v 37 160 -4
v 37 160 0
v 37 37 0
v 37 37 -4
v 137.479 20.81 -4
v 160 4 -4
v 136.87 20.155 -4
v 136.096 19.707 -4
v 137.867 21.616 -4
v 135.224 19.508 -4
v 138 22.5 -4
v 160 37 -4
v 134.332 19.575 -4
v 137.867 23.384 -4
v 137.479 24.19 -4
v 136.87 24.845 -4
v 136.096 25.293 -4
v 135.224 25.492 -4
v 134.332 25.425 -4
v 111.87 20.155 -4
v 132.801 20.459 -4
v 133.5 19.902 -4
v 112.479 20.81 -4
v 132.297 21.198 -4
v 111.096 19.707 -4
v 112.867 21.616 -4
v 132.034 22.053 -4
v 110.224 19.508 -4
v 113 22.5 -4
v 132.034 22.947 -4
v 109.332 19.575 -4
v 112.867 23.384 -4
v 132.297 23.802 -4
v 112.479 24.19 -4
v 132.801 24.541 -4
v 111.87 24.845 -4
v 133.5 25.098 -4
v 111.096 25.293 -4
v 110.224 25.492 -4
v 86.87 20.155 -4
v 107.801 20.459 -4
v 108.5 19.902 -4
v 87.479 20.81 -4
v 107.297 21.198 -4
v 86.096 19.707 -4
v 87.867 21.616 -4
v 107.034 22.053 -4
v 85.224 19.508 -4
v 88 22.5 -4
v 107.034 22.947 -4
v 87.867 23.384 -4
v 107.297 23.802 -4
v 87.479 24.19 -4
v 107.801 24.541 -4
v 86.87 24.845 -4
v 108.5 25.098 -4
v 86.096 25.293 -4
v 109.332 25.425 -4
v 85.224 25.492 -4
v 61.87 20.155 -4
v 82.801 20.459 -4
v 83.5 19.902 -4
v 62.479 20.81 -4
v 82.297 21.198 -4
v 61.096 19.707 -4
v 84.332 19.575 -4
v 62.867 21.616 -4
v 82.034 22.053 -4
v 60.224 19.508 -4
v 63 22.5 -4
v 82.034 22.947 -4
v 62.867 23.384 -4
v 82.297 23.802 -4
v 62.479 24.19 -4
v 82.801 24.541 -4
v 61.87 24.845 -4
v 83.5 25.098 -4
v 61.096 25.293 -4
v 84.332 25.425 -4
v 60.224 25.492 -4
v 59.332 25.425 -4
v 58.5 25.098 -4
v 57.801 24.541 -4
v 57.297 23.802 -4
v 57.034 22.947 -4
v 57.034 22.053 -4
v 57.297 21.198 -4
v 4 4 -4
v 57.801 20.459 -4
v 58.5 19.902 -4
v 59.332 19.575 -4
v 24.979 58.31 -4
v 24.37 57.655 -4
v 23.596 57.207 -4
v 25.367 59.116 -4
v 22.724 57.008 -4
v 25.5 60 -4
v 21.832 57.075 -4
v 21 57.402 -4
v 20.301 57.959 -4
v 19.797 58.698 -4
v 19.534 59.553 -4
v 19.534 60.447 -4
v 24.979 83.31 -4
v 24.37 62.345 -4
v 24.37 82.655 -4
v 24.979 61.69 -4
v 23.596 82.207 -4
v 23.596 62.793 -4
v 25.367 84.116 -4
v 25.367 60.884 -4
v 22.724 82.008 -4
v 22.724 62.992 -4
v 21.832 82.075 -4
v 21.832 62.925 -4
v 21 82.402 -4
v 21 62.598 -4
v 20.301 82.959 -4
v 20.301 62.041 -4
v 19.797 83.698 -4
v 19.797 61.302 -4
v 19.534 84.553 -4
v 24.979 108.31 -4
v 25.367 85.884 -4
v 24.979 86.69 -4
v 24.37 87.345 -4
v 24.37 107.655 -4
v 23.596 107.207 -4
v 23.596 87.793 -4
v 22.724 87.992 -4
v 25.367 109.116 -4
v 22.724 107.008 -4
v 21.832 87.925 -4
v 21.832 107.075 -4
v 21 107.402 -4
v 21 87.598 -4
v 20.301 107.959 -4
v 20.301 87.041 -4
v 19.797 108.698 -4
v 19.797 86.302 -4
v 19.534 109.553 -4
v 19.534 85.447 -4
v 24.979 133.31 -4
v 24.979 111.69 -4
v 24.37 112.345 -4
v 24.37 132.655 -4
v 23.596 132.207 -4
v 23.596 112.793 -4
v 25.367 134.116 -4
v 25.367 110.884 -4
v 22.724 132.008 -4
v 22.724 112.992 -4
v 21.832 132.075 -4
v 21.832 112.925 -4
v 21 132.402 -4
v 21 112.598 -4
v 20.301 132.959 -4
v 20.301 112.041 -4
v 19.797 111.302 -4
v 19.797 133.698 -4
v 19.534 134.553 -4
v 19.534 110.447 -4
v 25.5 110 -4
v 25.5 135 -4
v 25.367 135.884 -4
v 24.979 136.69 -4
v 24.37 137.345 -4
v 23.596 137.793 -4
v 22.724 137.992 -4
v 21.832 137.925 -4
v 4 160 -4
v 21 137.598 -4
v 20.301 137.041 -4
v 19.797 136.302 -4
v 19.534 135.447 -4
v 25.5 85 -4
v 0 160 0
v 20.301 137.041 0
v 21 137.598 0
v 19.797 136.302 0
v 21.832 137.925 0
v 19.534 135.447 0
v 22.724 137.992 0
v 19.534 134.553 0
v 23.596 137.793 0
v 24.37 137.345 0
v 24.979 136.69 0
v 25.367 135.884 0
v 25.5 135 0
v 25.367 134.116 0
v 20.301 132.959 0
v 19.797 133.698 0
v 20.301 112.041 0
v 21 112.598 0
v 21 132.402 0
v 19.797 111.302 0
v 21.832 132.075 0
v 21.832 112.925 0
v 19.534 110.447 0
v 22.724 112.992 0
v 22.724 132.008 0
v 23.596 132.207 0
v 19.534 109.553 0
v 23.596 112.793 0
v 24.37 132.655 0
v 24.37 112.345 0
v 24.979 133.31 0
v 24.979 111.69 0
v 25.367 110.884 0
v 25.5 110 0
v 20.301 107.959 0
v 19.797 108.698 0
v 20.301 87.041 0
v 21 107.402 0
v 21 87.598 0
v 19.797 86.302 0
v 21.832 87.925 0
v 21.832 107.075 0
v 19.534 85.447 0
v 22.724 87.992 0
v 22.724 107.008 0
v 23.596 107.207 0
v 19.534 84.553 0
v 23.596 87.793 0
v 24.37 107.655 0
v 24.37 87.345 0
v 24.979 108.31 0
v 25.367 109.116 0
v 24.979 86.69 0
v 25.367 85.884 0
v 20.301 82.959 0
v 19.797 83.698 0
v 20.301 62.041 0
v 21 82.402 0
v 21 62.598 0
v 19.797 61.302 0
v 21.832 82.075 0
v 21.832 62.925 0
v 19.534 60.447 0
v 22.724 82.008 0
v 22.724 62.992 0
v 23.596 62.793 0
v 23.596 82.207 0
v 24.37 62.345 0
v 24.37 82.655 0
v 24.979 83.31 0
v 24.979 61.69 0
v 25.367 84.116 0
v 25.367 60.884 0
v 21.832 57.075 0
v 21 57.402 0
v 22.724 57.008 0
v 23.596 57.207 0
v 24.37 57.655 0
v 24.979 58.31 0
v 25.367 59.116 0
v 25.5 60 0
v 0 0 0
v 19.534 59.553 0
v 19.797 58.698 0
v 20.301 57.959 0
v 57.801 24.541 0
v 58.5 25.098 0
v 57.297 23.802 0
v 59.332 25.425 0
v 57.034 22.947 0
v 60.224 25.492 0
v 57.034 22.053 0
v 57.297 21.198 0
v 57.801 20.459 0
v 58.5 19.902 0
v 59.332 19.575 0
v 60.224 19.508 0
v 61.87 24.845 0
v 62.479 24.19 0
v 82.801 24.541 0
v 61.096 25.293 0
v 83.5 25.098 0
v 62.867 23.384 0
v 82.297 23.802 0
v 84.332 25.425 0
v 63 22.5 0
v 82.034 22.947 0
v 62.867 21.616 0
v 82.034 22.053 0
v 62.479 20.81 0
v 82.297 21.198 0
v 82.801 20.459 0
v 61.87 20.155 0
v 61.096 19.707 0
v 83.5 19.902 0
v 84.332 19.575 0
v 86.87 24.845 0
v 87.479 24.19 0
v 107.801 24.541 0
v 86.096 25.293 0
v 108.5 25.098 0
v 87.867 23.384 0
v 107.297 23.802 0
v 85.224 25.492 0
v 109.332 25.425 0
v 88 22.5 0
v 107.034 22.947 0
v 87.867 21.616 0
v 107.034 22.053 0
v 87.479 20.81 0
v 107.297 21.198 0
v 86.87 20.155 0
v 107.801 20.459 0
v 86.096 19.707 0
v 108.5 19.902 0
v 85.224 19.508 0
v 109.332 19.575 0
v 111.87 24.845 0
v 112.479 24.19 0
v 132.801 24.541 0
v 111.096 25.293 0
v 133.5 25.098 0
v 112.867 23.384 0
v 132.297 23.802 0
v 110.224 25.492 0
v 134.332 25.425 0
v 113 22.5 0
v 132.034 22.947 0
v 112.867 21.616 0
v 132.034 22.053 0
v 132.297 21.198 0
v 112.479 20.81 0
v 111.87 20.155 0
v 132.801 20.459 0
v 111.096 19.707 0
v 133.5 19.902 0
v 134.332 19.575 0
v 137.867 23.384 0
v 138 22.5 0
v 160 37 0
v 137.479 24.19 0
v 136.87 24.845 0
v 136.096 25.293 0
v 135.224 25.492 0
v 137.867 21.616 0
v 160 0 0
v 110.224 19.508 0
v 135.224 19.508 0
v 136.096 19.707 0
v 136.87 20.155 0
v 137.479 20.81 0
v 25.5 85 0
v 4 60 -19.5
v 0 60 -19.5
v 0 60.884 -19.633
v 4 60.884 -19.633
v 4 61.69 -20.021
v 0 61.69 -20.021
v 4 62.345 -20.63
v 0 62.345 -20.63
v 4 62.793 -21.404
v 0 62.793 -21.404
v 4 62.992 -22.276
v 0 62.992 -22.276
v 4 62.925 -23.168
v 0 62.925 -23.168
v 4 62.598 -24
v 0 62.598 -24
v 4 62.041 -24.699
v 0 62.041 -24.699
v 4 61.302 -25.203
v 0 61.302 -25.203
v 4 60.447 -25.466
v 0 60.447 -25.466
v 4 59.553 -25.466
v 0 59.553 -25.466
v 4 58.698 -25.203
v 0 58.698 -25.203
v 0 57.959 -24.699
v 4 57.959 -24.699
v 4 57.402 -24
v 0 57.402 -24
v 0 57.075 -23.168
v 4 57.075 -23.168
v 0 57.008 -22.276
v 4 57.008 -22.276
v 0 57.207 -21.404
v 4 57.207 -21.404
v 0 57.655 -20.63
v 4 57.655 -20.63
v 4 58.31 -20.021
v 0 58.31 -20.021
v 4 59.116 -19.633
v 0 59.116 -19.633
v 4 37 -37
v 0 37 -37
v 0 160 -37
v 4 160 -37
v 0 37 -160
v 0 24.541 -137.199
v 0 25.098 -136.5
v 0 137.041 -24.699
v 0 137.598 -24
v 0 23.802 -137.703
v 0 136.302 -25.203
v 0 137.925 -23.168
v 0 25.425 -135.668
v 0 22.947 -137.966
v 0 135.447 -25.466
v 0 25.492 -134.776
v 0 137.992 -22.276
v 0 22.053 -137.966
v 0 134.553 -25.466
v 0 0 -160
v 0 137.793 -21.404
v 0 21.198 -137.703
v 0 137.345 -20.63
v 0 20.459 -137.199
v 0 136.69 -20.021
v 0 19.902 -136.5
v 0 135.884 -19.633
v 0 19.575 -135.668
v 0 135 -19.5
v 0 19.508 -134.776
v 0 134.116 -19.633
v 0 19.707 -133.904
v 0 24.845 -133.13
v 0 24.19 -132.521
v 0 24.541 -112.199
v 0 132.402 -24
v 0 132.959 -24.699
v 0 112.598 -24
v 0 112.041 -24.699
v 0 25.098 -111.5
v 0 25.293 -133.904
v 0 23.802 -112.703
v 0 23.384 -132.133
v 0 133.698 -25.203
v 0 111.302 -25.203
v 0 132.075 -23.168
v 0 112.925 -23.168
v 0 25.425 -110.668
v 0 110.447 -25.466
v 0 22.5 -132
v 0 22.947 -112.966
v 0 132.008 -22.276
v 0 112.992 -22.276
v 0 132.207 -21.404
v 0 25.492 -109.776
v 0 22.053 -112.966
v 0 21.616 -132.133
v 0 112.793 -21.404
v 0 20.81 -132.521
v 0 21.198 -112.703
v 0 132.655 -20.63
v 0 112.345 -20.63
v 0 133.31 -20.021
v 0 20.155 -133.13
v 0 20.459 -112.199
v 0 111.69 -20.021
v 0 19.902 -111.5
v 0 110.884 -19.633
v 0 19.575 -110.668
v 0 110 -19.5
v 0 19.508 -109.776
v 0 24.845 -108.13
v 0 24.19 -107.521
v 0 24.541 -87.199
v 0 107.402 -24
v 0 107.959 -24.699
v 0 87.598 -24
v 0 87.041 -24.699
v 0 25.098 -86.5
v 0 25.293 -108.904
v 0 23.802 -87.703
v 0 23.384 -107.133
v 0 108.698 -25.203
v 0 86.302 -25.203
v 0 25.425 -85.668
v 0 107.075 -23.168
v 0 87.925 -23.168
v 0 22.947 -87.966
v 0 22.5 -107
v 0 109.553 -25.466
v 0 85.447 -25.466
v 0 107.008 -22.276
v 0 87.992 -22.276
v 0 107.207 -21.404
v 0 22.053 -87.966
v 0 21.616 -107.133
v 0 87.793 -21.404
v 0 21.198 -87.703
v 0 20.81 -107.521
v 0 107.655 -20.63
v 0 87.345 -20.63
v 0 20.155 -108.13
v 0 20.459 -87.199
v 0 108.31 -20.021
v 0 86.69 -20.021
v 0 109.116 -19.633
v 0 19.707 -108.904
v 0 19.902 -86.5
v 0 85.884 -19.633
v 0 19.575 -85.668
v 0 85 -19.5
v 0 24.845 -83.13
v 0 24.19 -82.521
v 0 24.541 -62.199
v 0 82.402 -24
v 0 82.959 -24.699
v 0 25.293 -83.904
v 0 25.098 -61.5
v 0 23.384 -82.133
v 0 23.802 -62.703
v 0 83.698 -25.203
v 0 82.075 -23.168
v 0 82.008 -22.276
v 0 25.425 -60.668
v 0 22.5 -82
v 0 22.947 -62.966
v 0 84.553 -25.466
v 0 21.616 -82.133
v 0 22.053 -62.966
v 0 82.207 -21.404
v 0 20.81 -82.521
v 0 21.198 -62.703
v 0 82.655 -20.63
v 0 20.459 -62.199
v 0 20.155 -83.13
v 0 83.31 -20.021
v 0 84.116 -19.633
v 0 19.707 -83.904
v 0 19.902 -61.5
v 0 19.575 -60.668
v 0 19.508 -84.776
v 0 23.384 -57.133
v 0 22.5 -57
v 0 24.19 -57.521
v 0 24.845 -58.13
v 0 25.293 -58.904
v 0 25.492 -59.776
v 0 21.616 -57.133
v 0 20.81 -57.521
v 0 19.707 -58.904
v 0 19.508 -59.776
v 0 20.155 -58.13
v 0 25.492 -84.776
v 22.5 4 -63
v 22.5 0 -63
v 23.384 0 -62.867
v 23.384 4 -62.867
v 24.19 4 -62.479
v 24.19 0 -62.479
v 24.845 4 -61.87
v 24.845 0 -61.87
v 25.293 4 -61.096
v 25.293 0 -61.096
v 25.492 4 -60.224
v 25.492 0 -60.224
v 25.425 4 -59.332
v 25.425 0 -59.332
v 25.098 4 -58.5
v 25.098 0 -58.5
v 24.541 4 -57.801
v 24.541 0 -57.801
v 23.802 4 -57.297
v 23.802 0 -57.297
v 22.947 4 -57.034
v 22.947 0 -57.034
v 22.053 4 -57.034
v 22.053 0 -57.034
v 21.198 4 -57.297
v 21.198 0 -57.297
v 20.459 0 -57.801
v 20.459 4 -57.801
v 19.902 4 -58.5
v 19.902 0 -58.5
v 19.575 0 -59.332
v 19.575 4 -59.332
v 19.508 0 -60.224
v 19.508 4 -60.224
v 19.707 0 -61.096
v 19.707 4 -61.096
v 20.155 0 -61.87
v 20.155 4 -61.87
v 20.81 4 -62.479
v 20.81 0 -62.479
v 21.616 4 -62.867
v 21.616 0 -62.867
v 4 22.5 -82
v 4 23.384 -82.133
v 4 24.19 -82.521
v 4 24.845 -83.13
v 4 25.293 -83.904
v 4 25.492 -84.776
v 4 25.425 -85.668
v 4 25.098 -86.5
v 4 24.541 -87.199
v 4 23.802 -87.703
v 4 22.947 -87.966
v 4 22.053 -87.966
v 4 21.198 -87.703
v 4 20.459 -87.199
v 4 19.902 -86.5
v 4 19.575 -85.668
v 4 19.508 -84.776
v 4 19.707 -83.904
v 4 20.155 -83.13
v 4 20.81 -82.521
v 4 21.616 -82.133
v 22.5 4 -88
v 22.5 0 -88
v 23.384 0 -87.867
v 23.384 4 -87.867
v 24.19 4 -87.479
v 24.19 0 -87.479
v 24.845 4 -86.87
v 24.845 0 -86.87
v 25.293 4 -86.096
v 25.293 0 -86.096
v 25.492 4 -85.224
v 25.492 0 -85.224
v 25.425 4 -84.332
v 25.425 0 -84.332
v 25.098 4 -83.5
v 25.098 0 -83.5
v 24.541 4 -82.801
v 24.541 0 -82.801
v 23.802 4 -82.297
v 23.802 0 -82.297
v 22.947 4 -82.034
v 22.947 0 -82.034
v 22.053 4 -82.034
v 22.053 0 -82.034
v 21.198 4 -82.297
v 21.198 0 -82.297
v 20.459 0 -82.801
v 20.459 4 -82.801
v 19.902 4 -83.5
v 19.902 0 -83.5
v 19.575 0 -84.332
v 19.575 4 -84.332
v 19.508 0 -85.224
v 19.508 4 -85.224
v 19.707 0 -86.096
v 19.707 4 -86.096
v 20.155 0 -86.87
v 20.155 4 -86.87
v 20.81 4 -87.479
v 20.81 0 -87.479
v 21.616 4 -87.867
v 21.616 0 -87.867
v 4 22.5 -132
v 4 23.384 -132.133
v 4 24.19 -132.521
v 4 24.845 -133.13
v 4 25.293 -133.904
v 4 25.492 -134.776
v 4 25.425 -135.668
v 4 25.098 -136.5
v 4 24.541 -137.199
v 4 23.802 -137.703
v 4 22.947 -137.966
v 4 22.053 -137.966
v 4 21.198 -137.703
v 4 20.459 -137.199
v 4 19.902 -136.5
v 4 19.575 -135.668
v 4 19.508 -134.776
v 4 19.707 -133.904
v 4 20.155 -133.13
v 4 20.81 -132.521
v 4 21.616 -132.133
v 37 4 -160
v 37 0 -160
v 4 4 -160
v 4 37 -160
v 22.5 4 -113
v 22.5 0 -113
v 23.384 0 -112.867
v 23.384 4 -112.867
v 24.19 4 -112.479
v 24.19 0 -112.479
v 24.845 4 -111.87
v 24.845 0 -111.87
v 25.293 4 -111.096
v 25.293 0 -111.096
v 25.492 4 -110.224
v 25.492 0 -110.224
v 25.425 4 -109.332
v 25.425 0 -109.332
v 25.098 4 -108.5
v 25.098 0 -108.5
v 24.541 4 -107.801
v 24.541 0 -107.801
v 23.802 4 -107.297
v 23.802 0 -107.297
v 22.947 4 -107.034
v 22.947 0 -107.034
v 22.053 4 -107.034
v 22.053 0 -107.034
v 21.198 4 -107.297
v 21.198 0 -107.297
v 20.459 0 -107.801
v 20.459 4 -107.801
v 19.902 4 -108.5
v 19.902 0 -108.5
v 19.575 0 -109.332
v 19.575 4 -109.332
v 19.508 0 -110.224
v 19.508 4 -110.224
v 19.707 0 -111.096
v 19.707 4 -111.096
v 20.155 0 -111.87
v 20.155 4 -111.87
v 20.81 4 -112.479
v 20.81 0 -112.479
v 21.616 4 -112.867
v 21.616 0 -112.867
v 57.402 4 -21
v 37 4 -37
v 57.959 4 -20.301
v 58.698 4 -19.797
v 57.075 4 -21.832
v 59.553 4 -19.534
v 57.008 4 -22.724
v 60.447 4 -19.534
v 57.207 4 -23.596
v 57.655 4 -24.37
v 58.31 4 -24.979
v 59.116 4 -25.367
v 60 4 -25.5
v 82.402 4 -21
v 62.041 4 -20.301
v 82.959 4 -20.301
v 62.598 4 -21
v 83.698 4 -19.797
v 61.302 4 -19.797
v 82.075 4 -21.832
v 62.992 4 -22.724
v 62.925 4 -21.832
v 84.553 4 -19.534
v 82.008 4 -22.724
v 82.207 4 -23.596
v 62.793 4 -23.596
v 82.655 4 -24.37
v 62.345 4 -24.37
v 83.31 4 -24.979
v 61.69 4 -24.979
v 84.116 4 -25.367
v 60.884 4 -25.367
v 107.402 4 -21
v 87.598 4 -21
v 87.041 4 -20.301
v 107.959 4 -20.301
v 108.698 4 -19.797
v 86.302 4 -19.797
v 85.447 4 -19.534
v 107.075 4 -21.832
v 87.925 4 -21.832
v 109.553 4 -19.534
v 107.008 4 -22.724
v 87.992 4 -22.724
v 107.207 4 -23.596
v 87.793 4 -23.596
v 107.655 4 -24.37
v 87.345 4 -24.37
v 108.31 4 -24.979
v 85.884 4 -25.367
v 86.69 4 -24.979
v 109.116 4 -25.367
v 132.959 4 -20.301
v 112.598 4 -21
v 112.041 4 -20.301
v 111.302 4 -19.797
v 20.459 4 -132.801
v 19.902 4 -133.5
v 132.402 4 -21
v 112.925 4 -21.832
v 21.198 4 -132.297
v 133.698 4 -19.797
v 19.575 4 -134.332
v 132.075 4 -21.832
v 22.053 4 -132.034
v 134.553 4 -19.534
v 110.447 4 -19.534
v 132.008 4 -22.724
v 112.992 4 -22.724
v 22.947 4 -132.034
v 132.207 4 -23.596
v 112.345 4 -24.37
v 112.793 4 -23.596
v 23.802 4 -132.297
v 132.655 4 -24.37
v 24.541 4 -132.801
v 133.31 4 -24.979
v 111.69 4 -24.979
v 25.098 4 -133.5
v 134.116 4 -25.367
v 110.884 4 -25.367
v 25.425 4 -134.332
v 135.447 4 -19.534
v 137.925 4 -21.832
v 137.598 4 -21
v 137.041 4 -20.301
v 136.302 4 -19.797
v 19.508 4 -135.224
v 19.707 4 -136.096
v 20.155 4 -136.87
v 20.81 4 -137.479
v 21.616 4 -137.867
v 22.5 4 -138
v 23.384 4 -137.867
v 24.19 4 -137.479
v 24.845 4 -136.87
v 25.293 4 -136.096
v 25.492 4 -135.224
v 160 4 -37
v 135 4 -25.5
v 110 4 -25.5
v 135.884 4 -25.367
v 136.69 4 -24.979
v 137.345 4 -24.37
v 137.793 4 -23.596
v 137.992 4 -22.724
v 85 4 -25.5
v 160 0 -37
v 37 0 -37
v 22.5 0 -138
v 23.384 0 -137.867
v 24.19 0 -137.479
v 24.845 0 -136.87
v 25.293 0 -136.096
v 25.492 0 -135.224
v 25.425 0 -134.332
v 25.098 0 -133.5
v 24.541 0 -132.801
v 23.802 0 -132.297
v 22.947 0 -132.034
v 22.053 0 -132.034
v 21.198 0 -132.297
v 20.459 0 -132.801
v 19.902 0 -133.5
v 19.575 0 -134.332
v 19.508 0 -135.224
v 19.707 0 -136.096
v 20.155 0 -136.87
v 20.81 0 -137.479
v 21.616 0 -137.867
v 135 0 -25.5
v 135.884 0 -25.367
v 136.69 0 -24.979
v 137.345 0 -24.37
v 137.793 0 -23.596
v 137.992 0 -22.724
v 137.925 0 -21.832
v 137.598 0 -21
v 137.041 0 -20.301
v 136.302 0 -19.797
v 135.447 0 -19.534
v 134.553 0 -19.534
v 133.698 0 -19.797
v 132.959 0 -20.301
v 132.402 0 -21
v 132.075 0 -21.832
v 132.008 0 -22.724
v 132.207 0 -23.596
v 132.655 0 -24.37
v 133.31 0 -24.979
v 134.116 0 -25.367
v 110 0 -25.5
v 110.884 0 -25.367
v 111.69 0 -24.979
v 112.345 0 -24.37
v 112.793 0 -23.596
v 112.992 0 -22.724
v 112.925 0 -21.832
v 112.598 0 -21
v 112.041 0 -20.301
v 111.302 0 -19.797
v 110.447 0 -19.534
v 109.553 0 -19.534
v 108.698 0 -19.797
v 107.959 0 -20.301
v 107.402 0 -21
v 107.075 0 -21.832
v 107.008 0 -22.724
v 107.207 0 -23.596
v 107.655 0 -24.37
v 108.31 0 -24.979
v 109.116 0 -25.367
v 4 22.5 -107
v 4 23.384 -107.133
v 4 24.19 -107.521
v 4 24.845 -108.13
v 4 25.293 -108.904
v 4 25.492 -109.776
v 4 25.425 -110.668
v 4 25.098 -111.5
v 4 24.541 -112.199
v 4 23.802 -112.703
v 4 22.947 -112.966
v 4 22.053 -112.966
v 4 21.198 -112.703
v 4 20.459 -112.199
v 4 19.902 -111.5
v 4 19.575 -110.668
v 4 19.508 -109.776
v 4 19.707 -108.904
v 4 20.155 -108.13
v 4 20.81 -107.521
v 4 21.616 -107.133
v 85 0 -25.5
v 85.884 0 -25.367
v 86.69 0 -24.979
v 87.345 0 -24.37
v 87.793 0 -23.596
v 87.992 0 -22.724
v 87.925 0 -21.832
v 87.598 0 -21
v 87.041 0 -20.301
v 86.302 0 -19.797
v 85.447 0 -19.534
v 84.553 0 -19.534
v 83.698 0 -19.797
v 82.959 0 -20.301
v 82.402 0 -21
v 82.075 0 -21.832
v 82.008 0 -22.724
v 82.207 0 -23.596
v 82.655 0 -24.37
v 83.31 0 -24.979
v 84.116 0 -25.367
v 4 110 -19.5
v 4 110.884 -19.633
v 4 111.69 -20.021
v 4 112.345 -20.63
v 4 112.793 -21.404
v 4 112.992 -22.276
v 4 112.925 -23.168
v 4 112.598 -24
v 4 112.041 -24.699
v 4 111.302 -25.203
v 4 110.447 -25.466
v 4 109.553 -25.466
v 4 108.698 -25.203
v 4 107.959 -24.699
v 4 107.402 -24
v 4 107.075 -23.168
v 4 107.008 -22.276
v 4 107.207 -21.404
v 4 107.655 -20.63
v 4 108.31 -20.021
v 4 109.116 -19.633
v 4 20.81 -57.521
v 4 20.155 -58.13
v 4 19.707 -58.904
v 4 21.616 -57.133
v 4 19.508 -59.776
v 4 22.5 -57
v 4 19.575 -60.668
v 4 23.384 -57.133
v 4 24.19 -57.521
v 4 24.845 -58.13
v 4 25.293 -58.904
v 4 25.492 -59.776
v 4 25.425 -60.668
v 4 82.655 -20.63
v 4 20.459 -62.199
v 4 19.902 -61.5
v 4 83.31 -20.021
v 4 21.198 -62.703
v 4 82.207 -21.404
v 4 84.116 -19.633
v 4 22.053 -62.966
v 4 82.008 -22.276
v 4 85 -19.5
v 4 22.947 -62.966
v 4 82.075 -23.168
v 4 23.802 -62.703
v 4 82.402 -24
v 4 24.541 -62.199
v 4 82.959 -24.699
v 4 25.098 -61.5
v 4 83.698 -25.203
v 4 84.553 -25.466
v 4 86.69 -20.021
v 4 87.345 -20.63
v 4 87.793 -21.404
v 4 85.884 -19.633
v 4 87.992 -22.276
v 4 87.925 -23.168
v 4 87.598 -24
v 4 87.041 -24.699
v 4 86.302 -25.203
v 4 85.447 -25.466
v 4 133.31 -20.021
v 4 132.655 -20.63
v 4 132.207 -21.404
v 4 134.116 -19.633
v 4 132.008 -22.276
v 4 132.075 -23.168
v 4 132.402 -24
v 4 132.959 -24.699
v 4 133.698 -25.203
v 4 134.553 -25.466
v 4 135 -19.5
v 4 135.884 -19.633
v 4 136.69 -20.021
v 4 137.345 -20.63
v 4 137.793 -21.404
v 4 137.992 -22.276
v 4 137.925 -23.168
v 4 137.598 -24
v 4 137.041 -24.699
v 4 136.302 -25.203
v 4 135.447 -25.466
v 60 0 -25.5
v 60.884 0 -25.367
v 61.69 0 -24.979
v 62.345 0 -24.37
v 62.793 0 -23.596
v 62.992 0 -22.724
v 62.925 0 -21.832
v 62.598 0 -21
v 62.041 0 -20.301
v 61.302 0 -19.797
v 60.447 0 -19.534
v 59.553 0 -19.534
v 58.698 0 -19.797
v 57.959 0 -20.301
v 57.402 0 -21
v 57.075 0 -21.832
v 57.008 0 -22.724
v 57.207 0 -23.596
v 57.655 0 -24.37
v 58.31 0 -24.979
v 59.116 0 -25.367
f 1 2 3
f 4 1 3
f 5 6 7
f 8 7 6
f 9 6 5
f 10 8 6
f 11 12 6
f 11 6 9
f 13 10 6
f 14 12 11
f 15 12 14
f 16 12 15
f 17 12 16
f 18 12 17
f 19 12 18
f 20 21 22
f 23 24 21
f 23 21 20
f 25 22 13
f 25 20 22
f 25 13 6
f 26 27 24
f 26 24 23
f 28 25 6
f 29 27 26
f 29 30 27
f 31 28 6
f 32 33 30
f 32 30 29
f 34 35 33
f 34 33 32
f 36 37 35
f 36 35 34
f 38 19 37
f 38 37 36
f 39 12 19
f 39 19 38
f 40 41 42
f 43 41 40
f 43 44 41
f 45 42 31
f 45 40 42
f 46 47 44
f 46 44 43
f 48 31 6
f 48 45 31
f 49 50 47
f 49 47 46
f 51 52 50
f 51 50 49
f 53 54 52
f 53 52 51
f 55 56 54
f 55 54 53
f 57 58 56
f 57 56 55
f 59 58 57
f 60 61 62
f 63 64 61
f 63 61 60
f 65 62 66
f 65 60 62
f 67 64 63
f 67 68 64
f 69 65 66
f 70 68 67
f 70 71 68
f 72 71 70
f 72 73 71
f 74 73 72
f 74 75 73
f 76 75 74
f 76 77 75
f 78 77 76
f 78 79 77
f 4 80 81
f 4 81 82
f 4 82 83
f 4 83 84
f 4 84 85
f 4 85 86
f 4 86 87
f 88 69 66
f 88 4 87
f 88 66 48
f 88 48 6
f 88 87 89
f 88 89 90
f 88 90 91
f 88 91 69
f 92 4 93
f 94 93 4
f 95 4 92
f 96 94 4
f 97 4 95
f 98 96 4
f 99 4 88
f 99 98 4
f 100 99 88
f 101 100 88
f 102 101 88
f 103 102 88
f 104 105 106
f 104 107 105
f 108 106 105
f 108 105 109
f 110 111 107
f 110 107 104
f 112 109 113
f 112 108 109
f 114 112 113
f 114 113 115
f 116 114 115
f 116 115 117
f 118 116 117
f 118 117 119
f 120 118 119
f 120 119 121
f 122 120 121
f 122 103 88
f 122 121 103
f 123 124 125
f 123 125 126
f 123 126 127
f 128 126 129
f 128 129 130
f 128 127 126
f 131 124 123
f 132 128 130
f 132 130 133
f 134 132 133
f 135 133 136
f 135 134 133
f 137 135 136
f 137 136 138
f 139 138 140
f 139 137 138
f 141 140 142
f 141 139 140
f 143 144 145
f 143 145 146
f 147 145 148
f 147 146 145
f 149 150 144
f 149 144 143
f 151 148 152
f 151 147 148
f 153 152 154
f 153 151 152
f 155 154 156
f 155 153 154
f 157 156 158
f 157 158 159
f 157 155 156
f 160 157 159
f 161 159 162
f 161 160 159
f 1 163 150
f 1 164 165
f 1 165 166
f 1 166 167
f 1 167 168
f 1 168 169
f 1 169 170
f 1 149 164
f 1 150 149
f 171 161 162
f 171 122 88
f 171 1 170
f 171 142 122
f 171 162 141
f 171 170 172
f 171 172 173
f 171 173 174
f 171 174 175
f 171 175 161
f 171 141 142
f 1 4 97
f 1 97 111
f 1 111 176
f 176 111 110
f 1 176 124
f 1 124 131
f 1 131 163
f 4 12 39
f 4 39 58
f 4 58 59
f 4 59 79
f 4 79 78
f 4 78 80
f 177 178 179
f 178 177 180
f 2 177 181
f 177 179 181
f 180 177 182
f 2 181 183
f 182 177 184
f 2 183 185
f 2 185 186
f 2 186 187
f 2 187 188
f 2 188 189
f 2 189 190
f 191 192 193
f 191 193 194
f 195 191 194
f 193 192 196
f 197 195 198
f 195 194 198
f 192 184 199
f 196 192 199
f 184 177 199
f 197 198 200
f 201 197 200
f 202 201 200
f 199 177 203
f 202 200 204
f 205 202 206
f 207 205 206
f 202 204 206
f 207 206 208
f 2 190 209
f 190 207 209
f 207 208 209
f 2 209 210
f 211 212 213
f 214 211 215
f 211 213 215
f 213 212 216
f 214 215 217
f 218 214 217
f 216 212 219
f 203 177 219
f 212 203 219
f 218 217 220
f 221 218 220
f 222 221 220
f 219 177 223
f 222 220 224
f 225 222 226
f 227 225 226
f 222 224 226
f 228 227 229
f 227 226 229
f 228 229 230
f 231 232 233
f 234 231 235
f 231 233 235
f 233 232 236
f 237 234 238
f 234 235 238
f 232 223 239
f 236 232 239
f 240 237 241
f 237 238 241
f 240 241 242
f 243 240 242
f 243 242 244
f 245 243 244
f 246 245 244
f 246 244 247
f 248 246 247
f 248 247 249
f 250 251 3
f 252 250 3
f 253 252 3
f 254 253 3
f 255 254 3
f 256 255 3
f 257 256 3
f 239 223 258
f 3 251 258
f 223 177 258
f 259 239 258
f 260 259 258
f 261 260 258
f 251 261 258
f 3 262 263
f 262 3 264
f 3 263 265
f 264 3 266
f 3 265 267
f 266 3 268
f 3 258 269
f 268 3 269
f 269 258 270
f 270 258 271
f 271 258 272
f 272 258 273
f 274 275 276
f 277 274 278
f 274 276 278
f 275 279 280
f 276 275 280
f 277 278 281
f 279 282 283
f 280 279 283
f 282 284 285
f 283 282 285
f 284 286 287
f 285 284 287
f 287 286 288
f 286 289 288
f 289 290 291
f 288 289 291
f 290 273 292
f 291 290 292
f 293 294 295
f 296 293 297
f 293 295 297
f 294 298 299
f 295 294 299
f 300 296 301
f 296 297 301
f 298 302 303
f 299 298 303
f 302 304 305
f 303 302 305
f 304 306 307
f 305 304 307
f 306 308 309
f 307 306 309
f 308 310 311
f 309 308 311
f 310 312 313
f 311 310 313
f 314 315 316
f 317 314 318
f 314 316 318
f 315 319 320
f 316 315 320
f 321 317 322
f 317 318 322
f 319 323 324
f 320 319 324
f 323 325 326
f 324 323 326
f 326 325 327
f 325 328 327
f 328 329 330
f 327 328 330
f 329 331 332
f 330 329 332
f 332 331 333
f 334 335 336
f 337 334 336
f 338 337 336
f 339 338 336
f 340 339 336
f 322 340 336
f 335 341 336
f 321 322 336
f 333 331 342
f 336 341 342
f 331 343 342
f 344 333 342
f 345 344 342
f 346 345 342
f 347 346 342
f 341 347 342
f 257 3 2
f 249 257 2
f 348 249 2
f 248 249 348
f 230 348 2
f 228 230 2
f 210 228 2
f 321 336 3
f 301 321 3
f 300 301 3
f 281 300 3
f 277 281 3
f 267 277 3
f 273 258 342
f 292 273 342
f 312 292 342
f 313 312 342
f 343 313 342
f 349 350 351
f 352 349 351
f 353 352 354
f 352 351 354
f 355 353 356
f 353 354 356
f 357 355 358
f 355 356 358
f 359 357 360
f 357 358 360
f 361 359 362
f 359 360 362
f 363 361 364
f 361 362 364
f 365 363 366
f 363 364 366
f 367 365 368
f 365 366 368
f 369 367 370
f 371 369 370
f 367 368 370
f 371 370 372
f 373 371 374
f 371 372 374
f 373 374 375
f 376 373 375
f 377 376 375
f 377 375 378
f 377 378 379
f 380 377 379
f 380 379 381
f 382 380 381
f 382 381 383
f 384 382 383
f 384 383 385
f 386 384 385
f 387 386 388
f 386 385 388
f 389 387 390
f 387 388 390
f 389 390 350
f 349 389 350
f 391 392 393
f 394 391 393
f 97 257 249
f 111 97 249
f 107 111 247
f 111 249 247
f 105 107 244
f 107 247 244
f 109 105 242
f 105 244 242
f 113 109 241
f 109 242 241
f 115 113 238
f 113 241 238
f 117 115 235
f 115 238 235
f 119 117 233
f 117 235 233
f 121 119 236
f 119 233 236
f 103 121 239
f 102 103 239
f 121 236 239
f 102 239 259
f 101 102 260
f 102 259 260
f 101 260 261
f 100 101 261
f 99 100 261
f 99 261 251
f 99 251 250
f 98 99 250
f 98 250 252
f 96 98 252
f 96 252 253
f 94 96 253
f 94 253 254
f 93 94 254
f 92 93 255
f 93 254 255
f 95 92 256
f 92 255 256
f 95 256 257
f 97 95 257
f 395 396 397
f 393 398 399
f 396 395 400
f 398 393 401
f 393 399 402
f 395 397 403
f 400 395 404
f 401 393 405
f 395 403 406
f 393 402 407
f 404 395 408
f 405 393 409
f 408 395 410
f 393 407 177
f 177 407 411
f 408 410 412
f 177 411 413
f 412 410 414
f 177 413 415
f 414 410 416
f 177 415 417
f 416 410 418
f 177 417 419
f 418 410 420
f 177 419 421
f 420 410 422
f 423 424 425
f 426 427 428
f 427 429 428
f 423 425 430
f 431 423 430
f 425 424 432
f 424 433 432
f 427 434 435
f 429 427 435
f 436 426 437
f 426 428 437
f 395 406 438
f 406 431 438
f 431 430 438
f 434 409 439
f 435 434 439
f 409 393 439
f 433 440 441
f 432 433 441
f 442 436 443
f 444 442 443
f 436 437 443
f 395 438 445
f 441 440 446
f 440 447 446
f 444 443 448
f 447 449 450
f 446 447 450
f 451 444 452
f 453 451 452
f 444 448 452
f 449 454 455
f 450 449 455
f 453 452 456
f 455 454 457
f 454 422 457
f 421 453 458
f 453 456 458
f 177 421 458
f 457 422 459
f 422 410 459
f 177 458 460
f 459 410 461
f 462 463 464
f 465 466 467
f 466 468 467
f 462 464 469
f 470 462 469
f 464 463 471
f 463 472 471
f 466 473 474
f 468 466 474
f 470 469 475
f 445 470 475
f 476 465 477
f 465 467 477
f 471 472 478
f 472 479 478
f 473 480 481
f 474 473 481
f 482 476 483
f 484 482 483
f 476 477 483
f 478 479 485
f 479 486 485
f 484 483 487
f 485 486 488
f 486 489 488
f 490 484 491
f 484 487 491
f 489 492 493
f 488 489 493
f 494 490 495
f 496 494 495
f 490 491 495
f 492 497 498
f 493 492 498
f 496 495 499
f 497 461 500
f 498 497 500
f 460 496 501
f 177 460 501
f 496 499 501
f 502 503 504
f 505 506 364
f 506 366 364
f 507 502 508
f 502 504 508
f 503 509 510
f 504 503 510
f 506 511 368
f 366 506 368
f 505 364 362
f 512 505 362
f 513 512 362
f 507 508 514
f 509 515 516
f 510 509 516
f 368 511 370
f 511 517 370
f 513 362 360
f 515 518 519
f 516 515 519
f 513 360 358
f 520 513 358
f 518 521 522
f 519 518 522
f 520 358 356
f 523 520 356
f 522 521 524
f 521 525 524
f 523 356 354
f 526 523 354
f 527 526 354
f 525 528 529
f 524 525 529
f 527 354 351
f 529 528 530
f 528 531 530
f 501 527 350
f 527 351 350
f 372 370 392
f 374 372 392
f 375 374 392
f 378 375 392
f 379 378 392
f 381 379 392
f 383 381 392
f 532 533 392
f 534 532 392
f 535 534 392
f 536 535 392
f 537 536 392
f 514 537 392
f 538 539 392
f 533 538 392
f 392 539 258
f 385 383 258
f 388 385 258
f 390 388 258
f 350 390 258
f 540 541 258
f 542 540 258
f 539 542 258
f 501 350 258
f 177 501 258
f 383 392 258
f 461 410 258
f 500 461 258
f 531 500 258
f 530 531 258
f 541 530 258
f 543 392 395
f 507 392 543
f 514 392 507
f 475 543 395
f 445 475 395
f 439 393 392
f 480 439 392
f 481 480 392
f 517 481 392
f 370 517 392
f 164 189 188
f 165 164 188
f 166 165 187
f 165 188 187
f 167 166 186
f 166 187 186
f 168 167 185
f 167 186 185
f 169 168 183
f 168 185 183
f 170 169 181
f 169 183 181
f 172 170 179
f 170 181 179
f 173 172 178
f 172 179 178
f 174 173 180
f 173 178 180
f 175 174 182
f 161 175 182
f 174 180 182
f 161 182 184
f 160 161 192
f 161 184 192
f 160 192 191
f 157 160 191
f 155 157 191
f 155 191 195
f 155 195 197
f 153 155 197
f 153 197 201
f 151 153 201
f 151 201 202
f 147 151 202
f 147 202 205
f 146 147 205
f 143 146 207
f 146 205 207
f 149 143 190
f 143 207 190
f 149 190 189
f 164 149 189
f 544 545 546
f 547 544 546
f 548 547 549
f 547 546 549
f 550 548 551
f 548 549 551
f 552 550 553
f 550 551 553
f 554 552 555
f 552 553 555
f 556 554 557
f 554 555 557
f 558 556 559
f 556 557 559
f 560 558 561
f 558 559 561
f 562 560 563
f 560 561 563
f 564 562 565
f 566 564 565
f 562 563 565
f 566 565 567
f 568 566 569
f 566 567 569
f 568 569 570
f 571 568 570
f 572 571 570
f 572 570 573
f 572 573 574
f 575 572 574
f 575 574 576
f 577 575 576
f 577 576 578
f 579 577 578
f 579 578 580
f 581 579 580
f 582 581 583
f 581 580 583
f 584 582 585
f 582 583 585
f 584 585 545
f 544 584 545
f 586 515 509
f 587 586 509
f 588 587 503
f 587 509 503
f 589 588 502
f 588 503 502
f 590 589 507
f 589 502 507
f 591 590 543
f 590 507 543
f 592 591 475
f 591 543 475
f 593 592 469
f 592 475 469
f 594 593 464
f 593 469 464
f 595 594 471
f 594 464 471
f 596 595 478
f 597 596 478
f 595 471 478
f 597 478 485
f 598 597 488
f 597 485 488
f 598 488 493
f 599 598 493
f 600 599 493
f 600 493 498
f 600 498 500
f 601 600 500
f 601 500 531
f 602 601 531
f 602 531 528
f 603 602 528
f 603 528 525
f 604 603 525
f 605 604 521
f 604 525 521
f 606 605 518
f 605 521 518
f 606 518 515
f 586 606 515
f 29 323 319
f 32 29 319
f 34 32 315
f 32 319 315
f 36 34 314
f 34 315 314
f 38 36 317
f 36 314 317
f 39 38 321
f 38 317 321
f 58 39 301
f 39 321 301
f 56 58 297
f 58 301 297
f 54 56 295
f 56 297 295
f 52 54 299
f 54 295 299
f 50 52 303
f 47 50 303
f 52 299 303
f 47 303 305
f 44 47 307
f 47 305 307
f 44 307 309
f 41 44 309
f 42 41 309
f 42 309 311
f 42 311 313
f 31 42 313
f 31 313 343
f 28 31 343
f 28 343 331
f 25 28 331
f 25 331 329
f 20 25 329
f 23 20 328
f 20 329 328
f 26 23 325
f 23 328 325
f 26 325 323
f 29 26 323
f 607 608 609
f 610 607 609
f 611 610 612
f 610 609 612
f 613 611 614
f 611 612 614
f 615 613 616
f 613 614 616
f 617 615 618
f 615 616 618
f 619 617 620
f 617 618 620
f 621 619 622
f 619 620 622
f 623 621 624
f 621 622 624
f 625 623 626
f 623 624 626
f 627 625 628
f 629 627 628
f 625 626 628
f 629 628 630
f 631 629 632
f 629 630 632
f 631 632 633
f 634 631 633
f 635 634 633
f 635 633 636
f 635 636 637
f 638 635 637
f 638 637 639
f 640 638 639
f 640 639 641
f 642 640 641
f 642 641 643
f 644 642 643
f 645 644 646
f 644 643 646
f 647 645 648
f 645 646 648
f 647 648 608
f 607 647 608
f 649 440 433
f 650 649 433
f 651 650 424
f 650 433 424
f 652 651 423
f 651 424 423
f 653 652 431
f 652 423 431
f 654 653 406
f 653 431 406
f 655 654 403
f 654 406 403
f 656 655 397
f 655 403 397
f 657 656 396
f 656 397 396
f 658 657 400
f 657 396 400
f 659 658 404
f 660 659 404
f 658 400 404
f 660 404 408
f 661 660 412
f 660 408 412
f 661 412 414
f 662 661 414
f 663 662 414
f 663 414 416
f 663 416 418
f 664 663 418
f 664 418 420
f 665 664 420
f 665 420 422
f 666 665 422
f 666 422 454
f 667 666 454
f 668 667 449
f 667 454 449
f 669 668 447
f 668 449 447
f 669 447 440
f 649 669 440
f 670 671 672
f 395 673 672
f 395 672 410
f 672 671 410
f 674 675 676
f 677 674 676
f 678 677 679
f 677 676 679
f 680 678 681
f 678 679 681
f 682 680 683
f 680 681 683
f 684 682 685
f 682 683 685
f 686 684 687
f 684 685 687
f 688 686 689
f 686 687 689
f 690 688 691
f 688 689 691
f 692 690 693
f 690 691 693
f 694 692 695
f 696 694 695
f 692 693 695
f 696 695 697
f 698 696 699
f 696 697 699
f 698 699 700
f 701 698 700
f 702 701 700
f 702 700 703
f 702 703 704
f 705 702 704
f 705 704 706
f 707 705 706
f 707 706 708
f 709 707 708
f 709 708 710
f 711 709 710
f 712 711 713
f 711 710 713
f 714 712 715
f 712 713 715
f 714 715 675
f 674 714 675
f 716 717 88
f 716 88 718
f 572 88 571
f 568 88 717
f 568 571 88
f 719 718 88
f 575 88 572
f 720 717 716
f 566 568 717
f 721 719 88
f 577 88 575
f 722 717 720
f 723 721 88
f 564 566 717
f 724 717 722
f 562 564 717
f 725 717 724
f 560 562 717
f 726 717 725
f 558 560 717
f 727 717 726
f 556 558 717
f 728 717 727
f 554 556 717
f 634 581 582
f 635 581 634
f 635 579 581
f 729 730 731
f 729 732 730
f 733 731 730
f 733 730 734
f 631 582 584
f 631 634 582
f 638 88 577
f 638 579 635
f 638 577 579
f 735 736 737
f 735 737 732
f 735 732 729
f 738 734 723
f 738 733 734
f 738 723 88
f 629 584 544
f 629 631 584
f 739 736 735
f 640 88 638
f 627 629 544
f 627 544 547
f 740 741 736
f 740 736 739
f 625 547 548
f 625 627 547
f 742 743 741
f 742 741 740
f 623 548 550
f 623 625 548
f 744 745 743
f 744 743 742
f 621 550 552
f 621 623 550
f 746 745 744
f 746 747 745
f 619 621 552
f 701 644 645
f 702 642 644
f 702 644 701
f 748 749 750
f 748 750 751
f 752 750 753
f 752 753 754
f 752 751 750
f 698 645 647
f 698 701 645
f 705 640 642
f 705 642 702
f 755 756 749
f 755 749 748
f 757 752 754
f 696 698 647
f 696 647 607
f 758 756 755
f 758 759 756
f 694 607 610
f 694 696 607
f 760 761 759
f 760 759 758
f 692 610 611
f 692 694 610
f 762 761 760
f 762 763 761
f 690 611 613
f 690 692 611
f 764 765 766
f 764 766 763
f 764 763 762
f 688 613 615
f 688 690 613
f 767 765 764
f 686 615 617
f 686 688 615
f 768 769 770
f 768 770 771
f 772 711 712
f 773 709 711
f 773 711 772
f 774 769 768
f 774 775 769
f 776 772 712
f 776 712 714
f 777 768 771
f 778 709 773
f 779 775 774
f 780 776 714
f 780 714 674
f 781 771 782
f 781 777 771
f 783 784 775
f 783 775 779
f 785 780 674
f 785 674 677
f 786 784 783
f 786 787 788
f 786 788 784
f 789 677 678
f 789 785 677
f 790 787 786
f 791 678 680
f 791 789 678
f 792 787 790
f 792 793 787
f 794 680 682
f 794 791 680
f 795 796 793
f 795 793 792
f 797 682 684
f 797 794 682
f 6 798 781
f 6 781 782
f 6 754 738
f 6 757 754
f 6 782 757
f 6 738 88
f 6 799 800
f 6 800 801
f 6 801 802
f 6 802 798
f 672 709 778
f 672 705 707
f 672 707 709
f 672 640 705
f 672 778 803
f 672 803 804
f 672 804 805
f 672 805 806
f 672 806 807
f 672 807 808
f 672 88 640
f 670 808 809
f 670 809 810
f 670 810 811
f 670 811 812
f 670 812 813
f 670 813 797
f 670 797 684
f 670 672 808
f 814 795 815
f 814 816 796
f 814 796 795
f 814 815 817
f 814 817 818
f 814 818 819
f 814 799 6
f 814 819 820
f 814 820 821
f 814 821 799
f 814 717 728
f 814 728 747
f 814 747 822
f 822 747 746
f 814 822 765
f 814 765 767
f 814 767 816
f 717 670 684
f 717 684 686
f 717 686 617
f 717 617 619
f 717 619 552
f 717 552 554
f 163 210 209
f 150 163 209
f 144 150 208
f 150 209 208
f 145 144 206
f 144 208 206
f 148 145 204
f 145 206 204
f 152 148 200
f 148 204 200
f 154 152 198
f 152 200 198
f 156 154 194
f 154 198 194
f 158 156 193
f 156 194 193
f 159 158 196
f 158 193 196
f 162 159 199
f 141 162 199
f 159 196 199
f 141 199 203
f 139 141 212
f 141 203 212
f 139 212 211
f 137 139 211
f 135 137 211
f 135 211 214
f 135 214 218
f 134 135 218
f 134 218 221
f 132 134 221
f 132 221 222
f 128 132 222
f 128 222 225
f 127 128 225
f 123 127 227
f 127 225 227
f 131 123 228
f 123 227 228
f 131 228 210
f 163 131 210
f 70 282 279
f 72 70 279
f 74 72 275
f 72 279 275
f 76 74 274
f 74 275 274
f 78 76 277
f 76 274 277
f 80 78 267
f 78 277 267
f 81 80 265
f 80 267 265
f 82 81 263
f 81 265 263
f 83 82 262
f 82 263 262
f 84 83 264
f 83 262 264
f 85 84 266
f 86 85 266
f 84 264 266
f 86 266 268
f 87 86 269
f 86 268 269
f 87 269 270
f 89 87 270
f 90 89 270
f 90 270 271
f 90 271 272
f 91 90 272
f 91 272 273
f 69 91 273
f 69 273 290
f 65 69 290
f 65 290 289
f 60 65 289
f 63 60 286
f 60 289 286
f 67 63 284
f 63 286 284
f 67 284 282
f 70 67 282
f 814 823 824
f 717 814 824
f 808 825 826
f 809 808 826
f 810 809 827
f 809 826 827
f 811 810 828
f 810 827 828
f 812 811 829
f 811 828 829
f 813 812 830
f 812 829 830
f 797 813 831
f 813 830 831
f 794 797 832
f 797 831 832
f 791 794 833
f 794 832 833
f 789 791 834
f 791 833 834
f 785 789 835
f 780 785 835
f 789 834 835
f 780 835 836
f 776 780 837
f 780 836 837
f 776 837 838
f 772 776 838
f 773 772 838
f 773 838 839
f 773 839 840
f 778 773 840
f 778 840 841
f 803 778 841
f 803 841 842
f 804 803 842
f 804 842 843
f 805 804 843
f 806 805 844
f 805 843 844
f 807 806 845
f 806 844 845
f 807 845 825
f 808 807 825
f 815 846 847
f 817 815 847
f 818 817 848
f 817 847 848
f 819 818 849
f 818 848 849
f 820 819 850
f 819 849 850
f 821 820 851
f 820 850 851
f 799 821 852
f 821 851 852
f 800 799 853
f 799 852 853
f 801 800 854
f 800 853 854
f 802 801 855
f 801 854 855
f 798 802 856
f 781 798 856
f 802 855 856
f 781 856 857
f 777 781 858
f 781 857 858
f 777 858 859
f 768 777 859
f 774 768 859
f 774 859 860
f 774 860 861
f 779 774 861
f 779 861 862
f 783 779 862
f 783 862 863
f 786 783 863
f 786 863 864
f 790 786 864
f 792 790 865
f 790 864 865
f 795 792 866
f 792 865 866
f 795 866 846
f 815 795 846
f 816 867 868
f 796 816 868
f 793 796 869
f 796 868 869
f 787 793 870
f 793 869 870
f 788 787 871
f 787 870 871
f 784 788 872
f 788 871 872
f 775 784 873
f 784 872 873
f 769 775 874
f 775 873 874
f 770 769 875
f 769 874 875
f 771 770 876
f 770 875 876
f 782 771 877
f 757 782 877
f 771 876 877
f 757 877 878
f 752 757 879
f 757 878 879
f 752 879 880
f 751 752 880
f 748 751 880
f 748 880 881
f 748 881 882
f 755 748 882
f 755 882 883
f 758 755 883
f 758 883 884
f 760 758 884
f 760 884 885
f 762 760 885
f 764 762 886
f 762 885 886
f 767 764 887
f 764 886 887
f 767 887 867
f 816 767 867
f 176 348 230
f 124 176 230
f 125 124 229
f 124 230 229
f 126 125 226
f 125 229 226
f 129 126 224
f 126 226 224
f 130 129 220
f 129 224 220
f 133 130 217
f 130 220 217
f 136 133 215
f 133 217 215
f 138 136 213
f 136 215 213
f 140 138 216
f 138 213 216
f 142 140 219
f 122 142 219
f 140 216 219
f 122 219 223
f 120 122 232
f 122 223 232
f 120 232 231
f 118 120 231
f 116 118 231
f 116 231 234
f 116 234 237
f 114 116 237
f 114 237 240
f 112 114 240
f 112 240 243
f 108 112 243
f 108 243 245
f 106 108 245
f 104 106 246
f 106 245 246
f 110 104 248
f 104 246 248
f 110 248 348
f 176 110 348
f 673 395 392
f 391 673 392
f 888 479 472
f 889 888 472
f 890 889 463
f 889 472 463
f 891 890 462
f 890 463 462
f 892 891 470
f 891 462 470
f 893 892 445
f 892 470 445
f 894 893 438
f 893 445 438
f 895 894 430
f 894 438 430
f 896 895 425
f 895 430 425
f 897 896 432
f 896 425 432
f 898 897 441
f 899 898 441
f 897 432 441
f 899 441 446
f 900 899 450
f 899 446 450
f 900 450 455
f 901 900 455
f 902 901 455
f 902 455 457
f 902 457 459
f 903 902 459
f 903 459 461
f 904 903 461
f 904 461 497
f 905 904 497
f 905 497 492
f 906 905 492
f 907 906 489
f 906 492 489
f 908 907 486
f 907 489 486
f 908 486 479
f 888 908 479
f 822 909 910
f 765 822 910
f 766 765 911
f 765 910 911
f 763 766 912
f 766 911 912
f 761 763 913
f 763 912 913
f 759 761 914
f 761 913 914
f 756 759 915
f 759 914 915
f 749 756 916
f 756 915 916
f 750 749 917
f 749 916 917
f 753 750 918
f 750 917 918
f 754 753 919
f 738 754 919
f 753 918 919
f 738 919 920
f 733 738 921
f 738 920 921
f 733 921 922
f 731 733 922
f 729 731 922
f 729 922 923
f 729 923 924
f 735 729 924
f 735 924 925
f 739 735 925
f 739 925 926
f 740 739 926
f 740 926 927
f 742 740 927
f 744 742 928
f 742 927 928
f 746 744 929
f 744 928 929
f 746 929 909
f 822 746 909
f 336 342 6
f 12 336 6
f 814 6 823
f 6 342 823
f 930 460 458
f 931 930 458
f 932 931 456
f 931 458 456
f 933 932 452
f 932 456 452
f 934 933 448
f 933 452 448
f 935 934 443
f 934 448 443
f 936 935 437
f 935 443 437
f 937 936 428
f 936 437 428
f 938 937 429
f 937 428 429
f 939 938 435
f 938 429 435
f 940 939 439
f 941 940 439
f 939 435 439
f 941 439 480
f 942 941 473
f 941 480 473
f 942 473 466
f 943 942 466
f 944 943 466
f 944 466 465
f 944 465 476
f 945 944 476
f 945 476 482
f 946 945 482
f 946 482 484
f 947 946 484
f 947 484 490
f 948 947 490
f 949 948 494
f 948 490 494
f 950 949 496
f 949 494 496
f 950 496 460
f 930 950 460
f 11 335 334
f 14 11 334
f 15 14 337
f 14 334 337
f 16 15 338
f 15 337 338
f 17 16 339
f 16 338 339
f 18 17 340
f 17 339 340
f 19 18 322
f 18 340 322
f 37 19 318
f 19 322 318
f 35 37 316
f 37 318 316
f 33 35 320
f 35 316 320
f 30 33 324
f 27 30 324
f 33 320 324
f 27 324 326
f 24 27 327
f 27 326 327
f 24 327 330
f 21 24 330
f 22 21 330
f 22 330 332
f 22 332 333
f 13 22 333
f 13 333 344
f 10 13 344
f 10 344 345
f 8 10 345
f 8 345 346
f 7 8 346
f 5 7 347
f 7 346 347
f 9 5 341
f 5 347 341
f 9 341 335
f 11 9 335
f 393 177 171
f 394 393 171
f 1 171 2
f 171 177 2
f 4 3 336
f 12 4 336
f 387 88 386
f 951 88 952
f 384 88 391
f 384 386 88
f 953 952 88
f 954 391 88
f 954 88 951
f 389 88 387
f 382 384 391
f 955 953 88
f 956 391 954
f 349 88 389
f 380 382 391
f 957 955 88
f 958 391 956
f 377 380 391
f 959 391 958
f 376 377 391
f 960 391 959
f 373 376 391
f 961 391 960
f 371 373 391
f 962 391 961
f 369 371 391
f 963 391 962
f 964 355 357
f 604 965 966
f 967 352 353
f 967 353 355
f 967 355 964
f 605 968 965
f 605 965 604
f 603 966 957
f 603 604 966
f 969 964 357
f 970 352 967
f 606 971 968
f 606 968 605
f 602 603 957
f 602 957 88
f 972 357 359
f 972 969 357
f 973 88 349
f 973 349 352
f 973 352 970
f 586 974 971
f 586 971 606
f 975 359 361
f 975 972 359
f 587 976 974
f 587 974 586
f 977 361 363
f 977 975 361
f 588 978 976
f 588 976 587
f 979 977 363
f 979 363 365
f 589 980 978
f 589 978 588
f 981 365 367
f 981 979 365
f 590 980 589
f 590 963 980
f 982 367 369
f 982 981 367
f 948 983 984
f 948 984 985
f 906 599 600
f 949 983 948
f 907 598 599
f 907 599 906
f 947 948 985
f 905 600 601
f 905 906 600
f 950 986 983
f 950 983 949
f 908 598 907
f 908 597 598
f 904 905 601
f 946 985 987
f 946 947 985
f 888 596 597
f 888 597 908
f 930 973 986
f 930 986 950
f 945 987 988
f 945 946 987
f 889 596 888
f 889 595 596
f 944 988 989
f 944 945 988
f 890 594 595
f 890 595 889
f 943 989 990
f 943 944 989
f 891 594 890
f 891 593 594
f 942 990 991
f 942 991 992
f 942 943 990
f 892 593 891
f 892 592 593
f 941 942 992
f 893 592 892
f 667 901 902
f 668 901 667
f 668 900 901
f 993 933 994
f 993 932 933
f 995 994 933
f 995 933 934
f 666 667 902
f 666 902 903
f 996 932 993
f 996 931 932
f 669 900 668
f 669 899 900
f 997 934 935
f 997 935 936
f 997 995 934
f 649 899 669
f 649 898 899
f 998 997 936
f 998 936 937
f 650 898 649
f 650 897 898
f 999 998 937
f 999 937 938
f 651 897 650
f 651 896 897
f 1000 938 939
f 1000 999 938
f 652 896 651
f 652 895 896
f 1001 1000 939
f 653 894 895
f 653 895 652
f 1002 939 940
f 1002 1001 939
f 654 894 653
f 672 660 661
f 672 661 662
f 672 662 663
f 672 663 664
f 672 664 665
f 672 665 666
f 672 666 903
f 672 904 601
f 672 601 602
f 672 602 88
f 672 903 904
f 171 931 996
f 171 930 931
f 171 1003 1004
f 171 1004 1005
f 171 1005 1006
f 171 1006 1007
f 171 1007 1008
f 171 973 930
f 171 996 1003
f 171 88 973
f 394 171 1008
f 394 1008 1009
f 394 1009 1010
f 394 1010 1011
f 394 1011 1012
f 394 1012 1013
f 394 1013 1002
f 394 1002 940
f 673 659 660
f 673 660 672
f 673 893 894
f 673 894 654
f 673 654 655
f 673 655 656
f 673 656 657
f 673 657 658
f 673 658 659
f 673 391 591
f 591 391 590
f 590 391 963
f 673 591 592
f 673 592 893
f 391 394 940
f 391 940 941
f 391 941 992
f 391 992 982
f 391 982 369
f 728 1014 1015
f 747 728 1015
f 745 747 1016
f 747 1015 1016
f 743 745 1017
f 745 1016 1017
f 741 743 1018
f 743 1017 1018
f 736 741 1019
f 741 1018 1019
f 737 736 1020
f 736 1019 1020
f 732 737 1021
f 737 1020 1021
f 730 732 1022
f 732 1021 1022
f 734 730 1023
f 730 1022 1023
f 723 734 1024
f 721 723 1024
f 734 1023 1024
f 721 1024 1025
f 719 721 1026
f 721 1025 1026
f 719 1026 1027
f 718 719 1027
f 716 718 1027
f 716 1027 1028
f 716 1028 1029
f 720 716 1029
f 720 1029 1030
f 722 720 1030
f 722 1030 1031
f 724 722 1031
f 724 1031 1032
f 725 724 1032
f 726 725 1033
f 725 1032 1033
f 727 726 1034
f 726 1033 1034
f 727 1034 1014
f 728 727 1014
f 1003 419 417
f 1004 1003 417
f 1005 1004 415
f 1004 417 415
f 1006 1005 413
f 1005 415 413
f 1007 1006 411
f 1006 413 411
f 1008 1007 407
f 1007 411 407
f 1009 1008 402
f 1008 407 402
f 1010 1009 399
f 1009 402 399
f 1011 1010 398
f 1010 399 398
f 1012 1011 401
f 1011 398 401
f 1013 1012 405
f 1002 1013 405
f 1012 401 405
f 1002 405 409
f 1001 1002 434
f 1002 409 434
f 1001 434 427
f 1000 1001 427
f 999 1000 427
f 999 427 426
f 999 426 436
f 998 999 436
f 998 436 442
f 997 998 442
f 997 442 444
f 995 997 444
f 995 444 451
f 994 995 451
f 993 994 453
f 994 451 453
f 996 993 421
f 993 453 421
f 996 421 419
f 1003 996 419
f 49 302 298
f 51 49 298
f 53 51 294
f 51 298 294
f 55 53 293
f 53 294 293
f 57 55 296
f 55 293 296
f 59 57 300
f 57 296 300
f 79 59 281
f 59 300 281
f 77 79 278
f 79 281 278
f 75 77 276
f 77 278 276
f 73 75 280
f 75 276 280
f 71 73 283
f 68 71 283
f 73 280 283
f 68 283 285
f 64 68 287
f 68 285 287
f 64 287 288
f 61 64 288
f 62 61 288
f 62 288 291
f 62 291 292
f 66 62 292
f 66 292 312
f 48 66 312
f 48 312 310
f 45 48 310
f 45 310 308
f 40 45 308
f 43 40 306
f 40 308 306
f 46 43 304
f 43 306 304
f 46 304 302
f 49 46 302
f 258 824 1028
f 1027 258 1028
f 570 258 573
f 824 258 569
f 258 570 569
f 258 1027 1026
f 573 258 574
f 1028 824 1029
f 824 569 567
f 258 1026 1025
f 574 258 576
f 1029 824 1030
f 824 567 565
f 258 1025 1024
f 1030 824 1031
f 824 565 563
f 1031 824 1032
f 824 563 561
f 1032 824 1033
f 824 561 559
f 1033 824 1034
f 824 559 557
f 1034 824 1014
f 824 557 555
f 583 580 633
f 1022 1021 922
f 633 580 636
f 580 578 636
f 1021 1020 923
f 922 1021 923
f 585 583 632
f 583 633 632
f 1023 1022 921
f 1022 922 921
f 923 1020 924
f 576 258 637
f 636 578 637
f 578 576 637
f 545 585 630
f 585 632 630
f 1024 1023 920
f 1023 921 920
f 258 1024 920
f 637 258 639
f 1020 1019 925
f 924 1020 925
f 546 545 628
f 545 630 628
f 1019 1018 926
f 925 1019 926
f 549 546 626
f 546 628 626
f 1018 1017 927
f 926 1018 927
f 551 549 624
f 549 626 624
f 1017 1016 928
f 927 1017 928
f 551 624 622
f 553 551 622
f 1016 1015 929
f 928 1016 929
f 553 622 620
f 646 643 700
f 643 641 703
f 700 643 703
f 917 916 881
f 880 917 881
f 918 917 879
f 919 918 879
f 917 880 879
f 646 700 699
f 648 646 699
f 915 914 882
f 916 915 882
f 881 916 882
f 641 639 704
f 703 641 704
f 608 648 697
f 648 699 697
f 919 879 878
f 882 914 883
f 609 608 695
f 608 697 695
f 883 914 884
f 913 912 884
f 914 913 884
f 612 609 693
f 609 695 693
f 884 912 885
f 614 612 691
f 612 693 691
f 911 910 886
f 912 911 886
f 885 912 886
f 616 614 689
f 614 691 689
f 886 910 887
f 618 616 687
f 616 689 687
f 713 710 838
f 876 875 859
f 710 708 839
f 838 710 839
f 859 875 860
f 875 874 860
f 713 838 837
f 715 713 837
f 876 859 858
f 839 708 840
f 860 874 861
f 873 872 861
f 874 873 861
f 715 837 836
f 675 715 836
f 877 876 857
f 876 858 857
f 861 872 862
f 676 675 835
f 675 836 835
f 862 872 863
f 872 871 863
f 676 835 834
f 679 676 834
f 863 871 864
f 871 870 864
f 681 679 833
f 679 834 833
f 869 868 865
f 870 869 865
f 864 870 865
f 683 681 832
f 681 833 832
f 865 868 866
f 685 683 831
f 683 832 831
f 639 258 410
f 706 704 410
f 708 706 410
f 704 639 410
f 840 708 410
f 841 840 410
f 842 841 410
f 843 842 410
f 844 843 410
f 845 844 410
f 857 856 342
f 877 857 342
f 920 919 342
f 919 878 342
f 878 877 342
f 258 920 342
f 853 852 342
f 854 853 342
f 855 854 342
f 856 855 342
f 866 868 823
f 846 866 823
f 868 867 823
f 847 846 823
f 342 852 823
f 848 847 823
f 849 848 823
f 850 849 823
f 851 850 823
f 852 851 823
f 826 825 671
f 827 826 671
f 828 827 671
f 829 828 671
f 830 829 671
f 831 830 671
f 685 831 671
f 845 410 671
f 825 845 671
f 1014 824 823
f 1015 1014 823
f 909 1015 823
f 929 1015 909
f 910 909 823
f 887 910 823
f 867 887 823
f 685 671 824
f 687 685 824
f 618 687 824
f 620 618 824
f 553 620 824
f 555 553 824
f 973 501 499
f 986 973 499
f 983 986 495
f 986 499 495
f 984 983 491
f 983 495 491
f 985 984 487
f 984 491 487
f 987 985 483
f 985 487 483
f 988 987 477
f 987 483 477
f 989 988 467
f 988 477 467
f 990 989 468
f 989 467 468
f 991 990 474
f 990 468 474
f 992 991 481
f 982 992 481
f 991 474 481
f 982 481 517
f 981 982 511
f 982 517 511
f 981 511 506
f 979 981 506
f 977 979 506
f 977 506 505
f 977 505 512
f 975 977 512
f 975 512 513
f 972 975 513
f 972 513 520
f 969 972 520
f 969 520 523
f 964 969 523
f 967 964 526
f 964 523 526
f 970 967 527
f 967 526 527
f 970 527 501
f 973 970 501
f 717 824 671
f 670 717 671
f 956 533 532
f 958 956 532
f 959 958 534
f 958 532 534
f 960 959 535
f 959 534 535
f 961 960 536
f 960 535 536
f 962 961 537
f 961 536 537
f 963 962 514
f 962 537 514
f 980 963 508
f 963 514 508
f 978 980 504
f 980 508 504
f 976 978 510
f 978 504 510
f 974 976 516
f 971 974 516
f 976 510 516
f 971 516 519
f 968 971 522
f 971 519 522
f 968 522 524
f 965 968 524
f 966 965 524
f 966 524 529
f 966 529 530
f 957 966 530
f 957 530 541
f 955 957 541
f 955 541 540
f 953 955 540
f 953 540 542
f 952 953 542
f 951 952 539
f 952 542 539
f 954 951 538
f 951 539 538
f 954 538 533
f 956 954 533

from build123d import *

# Parameters (mm, degrees)
BOSS_EXTRUDE1_DEPTH = 4
BOSS_EXTRUDE2_DEPTH = 4
BOSS_EXTRUDE3_DEPTH = 4
SKETCH5_R           = 3
CUT_EXTRUDE2_DEPTH  = 4
SKETCH6_R           = 3
CUT_EXTRUDE3_DEPTH  = 4
SKETCH7_R           = 3
CUT_EXTRUDE4_DEPTH  = 4


with BuildPart() as part:
    # Sketch1 → Boss-Extrude1 (new body)
    with BuildSketch(Plane(origin=(0, 0, 0), x_dir=(1, 0, 0), z_dir=(0, 1, 0))):
        Polygon((0, 0), (160, 0), (160, 37), (37, 37), (37, 160), (0, 160), align=None)
    extrude(amount=BOSS_EXTRUDE1_DEPTH)

    # Sketch3 → Boss-Extrude2 (add)
    with BuildSketch(Plane.XY):
        Polygon((0, 0), (0, 160), (37, 160), (37, 37), (160, 37), (160, 0), align=None)
    extrude(amount=-BOSS_EXTRUDE2_DEPTH)

    # Sketch4 → Boss-Extrude3 (add)
    with BuildSketch(Plane.ZY):
        Polygon((0, 160), (0, 0), (-160, 0), (-160, 37), (-37, 37), (-37, 160), align=None)
    extrude(amount=-BOSS_EXTRUDE3_DEPTH)

    # Sketch5 → Cut-Extrude2 (cut)
    with BuildSketch(Plane.XZ):
        with Locations((135, -22.5)):
            Circle(SKETCH5_R)
        with Locations((110, -22.5)):
            Circle(SKETCH5_R)
        with Locations((85, -22.5)):
            Circle(SKETCH5_R)
        with Locations((22.5, -135)):
            Circle(SKETCH5_R)
        with Locations((22.5, -110)):
            Circle(SKETCH5_R)
        with Locations((22.5, -85)):
            Circle(SKETCH5_R)
        with Locations((22.5, -60)):
            Circle(SKETCH5_R)
        with Locations((60, -22.5)):
            Circle(SKETCH5_R)
    extrude(amount=-CUT_EXTRUDE2_DEPTH, mode=Mode.SUBTRACT)

    # Sketch6 → Cut-Extrude3 (cut)
    with BuildSketch(Plane.ZY):
        with Locations((-135, 22.5)):
            Circle(SKETCH6_R)
        with Locations((-110, 22.5)):
            Circle(SKETCH6_R)
        with Locations((-85, 22.5)):
            Circle(SKETCH6_R)
        with Locations((-60, 22.5)):
            Circle(SKETCH6_R)
        with Locations((-22.5, 135)):
            Circle(SKETCH6_R)
        with Locations((-22.5, 110)):
            Circle(SKETCH6_R)
        with Locations((-22.5, 85)):
            Circle(SKETCH6_R)
        with Locations((-22.5, 60)):
            Circle(SKETCH6_R)
    extrude(amount=-CUT_EXTRUDE3_DEPTH, mode=Mode.SUBTRACT)

    # Sketch7 → Cut-Extrude4 (cut)
    with BuildSketch(Plane.XY):
        with Locations((22.5, 60)):
            Circle(SKETCH7_R)
        with Locations((22.5, 85)):
            Circle(SKETCH7_R)
        with Locations((22.5, 110)):
            Circle(SKETCH7_R)
        with Locations((22.5, 135)):
            Circle(SKETCH7_R)
        with Locations((60, 22.5)):
            Circle(SKETCH7_R)
        with Locations((85, 22.5)):
            Circle(SKETCH7_R)
        with Locations((110, 22.5)):
            Circle(SKETCH7_R)
        with Locations((135, 22.5)):
            Circle(SKETCH7_R)
    extrude(amount=-CUT_EXTRUDE4_DEPTH, mode=Mode.SUBTRACT)


solid = part.part
